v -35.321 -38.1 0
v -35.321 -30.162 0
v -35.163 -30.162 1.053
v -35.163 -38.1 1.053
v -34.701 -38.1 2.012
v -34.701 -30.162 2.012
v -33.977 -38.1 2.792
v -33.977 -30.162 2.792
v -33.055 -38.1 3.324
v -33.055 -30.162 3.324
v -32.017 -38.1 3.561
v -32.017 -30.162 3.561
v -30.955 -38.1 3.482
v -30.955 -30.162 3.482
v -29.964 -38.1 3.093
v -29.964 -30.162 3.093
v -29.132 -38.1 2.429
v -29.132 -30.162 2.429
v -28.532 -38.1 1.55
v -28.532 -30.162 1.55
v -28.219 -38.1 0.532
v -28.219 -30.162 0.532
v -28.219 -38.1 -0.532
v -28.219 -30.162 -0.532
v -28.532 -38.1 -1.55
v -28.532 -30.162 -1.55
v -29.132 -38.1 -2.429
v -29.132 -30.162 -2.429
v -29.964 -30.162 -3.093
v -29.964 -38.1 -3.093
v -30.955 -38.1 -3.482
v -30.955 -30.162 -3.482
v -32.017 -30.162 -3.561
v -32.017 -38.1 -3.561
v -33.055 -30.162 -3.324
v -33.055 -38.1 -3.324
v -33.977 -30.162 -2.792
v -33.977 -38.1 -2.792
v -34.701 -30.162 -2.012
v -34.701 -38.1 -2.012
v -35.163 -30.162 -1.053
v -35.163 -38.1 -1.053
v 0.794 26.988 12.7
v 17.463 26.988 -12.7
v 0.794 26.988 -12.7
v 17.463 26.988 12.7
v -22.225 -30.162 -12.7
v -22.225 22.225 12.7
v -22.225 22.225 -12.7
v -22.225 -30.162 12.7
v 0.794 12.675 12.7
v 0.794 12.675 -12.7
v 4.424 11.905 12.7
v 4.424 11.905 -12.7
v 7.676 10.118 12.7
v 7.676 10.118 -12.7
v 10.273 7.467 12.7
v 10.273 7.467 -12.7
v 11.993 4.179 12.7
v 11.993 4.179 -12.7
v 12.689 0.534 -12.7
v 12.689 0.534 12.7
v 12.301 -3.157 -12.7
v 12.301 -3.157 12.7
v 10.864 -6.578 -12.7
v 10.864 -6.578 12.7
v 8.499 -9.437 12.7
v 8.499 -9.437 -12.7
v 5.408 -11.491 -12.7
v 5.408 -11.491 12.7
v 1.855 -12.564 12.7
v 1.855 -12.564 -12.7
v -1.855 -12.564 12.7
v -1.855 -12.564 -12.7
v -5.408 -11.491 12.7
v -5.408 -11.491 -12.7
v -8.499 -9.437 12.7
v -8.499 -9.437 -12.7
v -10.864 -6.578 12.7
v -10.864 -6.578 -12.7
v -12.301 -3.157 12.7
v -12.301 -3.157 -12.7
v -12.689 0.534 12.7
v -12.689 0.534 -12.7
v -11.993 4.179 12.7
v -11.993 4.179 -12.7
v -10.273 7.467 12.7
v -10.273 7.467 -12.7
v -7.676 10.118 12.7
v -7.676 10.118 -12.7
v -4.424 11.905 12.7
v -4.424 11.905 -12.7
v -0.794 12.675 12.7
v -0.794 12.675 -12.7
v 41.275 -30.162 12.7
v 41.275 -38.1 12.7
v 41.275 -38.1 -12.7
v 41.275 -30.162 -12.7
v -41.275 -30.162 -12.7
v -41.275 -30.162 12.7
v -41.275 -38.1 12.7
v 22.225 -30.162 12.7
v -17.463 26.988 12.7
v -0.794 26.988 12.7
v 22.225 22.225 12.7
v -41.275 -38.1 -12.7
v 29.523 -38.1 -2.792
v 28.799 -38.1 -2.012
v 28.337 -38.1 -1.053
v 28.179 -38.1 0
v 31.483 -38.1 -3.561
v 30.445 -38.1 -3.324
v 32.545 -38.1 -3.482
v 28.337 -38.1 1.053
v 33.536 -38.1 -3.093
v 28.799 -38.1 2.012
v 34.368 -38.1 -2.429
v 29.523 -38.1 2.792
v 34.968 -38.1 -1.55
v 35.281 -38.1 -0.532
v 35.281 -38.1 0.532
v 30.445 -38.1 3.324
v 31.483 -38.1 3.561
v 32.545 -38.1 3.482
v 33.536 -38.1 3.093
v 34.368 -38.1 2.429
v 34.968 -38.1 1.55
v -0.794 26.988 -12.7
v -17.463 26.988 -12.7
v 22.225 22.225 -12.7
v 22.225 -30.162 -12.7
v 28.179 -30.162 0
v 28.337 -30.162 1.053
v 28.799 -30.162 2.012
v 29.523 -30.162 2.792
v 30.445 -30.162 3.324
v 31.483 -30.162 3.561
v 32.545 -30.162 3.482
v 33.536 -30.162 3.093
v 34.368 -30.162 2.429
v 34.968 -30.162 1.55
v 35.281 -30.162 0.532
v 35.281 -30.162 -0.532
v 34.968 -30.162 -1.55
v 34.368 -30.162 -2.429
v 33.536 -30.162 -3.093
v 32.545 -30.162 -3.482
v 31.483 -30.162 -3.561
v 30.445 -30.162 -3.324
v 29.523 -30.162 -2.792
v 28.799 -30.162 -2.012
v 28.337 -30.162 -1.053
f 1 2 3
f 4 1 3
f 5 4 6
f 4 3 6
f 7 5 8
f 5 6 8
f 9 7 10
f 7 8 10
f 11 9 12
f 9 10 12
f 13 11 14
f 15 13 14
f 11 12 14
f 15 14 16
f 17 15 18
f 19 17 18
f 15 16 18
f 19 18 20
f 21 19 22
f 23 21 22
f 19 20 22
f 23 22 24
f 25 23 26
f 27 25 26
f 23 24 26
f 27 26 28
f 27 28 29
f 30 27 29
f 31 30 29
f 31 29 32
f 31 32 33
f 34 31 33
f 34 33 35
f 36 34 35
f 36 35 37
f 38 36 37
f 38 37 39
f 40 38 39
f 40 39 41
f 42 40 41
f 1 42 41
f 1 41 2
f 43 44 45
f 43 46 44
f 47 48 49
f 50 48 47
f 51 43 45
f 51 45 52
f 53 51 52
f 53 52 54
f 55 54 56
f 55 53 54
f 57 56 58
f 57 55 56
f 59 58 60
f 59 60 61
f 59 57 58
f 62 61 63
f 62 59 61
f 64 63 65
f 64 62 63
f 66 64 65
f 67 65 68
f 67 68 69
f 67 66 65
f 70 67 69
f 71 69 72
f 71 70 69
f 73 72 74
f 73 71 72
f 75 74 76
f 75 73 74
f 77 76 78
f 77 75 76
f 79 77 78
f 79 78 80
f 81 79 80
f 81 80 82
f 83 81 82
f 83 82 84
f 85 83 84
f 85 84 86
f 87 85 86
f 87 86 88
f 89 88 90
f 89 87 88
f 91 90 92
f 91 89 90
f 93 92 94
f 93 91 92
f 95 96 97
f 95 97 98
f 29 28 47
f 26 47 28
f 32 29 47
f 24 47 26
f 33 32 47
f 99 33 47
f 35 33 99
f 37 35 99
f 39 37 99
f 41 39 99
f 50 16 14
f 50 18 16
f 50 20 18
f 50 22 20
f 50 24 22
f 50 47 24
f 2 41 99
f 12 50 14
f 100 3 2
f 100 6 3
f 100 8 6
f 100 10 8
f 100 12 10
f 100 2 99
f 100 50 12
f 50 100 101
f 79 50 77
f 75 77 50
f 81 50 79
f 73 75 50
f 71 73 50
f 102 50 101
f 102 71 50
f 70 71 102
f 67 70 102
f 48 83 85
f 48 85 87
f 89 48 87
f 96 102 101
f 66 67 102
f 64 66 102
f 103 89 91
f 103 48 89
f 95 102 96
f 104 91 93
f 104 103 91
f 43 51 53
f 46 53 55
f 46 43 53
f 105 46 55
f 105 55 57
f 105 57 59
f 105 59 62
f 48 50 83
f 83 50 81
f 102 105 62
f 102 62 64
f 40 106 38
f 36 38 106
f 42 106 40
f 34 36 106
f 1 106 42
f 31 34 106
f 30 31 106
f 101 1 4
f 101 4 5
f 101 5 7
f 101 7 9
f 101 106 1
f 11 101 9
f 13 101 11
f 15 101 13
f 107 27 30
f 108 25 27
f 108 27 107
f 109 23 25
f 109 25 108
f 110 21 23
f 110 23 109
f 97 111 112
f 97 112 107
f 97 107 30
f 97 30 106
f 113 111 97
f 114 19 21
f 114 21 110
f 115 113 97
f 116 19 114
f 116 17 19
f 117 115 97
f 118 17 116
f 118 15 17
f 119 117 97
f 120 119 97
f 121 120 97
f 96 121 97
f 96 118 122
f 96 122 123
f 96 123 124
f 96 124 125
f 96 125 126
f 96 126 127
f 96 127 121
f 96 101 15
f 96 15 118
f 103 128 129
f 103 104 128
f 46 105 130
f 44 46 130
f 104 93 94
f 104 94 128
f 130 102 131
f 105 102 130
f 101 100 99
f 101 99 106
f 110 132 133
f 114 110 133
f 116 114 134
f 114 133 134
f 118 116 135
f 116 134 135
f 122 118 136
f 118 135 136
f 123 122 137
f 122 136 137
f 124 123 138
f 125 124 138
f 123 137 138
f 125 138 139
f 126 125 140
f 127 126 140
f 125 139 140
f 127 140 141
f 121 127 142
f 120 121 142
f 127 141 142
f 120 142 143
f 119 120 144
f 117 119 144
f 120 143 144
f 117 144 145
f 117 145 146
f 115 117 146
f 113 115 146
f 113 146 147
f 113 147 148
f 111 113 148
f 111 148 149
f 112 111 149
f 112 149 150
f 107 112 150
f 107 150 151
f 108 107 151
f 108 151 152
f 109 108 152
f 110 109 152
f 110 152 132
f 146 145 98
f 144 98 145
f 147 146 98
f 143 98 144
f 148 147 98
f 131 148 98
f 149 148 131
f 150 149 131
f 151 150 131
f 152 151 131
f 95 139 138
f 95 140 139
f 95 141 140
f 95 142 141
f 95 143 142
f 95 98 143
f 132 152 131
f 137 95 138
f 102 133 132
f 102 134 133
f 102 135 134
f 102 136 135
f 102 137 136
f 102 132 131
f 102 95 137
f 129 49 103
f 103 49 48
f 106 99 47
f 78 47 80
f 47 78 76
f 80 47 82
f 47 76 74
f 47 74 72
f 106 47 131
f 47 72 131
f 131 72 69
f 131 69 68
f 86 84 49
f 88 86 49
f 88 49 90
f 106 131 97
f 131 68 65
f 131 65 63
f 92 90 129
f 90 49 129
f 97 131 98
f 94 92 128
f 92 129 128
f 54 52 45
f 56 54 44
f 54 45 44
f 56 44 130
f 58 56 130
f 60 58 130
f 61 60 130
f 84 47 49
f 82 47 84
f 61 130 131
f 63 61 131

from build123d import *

# Parameters (mm, degrees)
EXTRUDE1_DEPTH          = 12.7
F_1_4_CLEARANCE_HOLE1_D = 7.14248
CHAMFER1_SIZE           = 4.7625


with BuildPart() as part:
    # Sketch1 → Extrude1 (new, symmetric)
    with BuildSketch(Plane.XY):
        with BuildLine():
            Line((22.225, 26.9875), (0.79375, 26.9875))
            Line((0.79375, 26.9875), (0.79375, 12.675171042))
            ThreePointArc((0.79375, 12.675171042), (0, -12.7), (-0.79375, 12.675171042))
            Line((-0.79375, 12.675171042), (-0.79375, 26.9875))
            Line((-0.79375, 26.9875), (-22.225, 26.9875))
            Line((-22.225, 26.9875), (-22.225, -30.1625))
            Line((-22.225, -30.1625), (-41.275, -30.1625))
            Line((-41.275, -30.1625), (-41.275, -38.1))
            Line((-41.275, -38.1), (41.275, -38.1))
            Line((41.275, -38.1), (41.275, -30.1625))
            Line((41.275, -30.1625), (22.225, -30.1625))
            Line((22.225, -30.1625), (22.225, 26.9875))
        make_face()
    extrude(amount=EXTRUDE1_DEPTH, both=True)

    # 1/4 Clearance Hole1 (through all)
    with Locations(Plane.XZ.offset(38.1)):
        with Locations((-31.75, 0), (31.75, 0)):
            Hole(F_1_4_CLEARANCE_HOLE1_D / 2)

    # Chamfer1
    chamfer1_edges = [part.edges().sort_by_distance(p)[0] for p in [
        (-22.225, 26.9875, 0),
        (22.225, 26.9875, 0),
    ]]
    chamfer(chamfer1_edges, length=CHAMFER1_SIZE)


solid = part.part
